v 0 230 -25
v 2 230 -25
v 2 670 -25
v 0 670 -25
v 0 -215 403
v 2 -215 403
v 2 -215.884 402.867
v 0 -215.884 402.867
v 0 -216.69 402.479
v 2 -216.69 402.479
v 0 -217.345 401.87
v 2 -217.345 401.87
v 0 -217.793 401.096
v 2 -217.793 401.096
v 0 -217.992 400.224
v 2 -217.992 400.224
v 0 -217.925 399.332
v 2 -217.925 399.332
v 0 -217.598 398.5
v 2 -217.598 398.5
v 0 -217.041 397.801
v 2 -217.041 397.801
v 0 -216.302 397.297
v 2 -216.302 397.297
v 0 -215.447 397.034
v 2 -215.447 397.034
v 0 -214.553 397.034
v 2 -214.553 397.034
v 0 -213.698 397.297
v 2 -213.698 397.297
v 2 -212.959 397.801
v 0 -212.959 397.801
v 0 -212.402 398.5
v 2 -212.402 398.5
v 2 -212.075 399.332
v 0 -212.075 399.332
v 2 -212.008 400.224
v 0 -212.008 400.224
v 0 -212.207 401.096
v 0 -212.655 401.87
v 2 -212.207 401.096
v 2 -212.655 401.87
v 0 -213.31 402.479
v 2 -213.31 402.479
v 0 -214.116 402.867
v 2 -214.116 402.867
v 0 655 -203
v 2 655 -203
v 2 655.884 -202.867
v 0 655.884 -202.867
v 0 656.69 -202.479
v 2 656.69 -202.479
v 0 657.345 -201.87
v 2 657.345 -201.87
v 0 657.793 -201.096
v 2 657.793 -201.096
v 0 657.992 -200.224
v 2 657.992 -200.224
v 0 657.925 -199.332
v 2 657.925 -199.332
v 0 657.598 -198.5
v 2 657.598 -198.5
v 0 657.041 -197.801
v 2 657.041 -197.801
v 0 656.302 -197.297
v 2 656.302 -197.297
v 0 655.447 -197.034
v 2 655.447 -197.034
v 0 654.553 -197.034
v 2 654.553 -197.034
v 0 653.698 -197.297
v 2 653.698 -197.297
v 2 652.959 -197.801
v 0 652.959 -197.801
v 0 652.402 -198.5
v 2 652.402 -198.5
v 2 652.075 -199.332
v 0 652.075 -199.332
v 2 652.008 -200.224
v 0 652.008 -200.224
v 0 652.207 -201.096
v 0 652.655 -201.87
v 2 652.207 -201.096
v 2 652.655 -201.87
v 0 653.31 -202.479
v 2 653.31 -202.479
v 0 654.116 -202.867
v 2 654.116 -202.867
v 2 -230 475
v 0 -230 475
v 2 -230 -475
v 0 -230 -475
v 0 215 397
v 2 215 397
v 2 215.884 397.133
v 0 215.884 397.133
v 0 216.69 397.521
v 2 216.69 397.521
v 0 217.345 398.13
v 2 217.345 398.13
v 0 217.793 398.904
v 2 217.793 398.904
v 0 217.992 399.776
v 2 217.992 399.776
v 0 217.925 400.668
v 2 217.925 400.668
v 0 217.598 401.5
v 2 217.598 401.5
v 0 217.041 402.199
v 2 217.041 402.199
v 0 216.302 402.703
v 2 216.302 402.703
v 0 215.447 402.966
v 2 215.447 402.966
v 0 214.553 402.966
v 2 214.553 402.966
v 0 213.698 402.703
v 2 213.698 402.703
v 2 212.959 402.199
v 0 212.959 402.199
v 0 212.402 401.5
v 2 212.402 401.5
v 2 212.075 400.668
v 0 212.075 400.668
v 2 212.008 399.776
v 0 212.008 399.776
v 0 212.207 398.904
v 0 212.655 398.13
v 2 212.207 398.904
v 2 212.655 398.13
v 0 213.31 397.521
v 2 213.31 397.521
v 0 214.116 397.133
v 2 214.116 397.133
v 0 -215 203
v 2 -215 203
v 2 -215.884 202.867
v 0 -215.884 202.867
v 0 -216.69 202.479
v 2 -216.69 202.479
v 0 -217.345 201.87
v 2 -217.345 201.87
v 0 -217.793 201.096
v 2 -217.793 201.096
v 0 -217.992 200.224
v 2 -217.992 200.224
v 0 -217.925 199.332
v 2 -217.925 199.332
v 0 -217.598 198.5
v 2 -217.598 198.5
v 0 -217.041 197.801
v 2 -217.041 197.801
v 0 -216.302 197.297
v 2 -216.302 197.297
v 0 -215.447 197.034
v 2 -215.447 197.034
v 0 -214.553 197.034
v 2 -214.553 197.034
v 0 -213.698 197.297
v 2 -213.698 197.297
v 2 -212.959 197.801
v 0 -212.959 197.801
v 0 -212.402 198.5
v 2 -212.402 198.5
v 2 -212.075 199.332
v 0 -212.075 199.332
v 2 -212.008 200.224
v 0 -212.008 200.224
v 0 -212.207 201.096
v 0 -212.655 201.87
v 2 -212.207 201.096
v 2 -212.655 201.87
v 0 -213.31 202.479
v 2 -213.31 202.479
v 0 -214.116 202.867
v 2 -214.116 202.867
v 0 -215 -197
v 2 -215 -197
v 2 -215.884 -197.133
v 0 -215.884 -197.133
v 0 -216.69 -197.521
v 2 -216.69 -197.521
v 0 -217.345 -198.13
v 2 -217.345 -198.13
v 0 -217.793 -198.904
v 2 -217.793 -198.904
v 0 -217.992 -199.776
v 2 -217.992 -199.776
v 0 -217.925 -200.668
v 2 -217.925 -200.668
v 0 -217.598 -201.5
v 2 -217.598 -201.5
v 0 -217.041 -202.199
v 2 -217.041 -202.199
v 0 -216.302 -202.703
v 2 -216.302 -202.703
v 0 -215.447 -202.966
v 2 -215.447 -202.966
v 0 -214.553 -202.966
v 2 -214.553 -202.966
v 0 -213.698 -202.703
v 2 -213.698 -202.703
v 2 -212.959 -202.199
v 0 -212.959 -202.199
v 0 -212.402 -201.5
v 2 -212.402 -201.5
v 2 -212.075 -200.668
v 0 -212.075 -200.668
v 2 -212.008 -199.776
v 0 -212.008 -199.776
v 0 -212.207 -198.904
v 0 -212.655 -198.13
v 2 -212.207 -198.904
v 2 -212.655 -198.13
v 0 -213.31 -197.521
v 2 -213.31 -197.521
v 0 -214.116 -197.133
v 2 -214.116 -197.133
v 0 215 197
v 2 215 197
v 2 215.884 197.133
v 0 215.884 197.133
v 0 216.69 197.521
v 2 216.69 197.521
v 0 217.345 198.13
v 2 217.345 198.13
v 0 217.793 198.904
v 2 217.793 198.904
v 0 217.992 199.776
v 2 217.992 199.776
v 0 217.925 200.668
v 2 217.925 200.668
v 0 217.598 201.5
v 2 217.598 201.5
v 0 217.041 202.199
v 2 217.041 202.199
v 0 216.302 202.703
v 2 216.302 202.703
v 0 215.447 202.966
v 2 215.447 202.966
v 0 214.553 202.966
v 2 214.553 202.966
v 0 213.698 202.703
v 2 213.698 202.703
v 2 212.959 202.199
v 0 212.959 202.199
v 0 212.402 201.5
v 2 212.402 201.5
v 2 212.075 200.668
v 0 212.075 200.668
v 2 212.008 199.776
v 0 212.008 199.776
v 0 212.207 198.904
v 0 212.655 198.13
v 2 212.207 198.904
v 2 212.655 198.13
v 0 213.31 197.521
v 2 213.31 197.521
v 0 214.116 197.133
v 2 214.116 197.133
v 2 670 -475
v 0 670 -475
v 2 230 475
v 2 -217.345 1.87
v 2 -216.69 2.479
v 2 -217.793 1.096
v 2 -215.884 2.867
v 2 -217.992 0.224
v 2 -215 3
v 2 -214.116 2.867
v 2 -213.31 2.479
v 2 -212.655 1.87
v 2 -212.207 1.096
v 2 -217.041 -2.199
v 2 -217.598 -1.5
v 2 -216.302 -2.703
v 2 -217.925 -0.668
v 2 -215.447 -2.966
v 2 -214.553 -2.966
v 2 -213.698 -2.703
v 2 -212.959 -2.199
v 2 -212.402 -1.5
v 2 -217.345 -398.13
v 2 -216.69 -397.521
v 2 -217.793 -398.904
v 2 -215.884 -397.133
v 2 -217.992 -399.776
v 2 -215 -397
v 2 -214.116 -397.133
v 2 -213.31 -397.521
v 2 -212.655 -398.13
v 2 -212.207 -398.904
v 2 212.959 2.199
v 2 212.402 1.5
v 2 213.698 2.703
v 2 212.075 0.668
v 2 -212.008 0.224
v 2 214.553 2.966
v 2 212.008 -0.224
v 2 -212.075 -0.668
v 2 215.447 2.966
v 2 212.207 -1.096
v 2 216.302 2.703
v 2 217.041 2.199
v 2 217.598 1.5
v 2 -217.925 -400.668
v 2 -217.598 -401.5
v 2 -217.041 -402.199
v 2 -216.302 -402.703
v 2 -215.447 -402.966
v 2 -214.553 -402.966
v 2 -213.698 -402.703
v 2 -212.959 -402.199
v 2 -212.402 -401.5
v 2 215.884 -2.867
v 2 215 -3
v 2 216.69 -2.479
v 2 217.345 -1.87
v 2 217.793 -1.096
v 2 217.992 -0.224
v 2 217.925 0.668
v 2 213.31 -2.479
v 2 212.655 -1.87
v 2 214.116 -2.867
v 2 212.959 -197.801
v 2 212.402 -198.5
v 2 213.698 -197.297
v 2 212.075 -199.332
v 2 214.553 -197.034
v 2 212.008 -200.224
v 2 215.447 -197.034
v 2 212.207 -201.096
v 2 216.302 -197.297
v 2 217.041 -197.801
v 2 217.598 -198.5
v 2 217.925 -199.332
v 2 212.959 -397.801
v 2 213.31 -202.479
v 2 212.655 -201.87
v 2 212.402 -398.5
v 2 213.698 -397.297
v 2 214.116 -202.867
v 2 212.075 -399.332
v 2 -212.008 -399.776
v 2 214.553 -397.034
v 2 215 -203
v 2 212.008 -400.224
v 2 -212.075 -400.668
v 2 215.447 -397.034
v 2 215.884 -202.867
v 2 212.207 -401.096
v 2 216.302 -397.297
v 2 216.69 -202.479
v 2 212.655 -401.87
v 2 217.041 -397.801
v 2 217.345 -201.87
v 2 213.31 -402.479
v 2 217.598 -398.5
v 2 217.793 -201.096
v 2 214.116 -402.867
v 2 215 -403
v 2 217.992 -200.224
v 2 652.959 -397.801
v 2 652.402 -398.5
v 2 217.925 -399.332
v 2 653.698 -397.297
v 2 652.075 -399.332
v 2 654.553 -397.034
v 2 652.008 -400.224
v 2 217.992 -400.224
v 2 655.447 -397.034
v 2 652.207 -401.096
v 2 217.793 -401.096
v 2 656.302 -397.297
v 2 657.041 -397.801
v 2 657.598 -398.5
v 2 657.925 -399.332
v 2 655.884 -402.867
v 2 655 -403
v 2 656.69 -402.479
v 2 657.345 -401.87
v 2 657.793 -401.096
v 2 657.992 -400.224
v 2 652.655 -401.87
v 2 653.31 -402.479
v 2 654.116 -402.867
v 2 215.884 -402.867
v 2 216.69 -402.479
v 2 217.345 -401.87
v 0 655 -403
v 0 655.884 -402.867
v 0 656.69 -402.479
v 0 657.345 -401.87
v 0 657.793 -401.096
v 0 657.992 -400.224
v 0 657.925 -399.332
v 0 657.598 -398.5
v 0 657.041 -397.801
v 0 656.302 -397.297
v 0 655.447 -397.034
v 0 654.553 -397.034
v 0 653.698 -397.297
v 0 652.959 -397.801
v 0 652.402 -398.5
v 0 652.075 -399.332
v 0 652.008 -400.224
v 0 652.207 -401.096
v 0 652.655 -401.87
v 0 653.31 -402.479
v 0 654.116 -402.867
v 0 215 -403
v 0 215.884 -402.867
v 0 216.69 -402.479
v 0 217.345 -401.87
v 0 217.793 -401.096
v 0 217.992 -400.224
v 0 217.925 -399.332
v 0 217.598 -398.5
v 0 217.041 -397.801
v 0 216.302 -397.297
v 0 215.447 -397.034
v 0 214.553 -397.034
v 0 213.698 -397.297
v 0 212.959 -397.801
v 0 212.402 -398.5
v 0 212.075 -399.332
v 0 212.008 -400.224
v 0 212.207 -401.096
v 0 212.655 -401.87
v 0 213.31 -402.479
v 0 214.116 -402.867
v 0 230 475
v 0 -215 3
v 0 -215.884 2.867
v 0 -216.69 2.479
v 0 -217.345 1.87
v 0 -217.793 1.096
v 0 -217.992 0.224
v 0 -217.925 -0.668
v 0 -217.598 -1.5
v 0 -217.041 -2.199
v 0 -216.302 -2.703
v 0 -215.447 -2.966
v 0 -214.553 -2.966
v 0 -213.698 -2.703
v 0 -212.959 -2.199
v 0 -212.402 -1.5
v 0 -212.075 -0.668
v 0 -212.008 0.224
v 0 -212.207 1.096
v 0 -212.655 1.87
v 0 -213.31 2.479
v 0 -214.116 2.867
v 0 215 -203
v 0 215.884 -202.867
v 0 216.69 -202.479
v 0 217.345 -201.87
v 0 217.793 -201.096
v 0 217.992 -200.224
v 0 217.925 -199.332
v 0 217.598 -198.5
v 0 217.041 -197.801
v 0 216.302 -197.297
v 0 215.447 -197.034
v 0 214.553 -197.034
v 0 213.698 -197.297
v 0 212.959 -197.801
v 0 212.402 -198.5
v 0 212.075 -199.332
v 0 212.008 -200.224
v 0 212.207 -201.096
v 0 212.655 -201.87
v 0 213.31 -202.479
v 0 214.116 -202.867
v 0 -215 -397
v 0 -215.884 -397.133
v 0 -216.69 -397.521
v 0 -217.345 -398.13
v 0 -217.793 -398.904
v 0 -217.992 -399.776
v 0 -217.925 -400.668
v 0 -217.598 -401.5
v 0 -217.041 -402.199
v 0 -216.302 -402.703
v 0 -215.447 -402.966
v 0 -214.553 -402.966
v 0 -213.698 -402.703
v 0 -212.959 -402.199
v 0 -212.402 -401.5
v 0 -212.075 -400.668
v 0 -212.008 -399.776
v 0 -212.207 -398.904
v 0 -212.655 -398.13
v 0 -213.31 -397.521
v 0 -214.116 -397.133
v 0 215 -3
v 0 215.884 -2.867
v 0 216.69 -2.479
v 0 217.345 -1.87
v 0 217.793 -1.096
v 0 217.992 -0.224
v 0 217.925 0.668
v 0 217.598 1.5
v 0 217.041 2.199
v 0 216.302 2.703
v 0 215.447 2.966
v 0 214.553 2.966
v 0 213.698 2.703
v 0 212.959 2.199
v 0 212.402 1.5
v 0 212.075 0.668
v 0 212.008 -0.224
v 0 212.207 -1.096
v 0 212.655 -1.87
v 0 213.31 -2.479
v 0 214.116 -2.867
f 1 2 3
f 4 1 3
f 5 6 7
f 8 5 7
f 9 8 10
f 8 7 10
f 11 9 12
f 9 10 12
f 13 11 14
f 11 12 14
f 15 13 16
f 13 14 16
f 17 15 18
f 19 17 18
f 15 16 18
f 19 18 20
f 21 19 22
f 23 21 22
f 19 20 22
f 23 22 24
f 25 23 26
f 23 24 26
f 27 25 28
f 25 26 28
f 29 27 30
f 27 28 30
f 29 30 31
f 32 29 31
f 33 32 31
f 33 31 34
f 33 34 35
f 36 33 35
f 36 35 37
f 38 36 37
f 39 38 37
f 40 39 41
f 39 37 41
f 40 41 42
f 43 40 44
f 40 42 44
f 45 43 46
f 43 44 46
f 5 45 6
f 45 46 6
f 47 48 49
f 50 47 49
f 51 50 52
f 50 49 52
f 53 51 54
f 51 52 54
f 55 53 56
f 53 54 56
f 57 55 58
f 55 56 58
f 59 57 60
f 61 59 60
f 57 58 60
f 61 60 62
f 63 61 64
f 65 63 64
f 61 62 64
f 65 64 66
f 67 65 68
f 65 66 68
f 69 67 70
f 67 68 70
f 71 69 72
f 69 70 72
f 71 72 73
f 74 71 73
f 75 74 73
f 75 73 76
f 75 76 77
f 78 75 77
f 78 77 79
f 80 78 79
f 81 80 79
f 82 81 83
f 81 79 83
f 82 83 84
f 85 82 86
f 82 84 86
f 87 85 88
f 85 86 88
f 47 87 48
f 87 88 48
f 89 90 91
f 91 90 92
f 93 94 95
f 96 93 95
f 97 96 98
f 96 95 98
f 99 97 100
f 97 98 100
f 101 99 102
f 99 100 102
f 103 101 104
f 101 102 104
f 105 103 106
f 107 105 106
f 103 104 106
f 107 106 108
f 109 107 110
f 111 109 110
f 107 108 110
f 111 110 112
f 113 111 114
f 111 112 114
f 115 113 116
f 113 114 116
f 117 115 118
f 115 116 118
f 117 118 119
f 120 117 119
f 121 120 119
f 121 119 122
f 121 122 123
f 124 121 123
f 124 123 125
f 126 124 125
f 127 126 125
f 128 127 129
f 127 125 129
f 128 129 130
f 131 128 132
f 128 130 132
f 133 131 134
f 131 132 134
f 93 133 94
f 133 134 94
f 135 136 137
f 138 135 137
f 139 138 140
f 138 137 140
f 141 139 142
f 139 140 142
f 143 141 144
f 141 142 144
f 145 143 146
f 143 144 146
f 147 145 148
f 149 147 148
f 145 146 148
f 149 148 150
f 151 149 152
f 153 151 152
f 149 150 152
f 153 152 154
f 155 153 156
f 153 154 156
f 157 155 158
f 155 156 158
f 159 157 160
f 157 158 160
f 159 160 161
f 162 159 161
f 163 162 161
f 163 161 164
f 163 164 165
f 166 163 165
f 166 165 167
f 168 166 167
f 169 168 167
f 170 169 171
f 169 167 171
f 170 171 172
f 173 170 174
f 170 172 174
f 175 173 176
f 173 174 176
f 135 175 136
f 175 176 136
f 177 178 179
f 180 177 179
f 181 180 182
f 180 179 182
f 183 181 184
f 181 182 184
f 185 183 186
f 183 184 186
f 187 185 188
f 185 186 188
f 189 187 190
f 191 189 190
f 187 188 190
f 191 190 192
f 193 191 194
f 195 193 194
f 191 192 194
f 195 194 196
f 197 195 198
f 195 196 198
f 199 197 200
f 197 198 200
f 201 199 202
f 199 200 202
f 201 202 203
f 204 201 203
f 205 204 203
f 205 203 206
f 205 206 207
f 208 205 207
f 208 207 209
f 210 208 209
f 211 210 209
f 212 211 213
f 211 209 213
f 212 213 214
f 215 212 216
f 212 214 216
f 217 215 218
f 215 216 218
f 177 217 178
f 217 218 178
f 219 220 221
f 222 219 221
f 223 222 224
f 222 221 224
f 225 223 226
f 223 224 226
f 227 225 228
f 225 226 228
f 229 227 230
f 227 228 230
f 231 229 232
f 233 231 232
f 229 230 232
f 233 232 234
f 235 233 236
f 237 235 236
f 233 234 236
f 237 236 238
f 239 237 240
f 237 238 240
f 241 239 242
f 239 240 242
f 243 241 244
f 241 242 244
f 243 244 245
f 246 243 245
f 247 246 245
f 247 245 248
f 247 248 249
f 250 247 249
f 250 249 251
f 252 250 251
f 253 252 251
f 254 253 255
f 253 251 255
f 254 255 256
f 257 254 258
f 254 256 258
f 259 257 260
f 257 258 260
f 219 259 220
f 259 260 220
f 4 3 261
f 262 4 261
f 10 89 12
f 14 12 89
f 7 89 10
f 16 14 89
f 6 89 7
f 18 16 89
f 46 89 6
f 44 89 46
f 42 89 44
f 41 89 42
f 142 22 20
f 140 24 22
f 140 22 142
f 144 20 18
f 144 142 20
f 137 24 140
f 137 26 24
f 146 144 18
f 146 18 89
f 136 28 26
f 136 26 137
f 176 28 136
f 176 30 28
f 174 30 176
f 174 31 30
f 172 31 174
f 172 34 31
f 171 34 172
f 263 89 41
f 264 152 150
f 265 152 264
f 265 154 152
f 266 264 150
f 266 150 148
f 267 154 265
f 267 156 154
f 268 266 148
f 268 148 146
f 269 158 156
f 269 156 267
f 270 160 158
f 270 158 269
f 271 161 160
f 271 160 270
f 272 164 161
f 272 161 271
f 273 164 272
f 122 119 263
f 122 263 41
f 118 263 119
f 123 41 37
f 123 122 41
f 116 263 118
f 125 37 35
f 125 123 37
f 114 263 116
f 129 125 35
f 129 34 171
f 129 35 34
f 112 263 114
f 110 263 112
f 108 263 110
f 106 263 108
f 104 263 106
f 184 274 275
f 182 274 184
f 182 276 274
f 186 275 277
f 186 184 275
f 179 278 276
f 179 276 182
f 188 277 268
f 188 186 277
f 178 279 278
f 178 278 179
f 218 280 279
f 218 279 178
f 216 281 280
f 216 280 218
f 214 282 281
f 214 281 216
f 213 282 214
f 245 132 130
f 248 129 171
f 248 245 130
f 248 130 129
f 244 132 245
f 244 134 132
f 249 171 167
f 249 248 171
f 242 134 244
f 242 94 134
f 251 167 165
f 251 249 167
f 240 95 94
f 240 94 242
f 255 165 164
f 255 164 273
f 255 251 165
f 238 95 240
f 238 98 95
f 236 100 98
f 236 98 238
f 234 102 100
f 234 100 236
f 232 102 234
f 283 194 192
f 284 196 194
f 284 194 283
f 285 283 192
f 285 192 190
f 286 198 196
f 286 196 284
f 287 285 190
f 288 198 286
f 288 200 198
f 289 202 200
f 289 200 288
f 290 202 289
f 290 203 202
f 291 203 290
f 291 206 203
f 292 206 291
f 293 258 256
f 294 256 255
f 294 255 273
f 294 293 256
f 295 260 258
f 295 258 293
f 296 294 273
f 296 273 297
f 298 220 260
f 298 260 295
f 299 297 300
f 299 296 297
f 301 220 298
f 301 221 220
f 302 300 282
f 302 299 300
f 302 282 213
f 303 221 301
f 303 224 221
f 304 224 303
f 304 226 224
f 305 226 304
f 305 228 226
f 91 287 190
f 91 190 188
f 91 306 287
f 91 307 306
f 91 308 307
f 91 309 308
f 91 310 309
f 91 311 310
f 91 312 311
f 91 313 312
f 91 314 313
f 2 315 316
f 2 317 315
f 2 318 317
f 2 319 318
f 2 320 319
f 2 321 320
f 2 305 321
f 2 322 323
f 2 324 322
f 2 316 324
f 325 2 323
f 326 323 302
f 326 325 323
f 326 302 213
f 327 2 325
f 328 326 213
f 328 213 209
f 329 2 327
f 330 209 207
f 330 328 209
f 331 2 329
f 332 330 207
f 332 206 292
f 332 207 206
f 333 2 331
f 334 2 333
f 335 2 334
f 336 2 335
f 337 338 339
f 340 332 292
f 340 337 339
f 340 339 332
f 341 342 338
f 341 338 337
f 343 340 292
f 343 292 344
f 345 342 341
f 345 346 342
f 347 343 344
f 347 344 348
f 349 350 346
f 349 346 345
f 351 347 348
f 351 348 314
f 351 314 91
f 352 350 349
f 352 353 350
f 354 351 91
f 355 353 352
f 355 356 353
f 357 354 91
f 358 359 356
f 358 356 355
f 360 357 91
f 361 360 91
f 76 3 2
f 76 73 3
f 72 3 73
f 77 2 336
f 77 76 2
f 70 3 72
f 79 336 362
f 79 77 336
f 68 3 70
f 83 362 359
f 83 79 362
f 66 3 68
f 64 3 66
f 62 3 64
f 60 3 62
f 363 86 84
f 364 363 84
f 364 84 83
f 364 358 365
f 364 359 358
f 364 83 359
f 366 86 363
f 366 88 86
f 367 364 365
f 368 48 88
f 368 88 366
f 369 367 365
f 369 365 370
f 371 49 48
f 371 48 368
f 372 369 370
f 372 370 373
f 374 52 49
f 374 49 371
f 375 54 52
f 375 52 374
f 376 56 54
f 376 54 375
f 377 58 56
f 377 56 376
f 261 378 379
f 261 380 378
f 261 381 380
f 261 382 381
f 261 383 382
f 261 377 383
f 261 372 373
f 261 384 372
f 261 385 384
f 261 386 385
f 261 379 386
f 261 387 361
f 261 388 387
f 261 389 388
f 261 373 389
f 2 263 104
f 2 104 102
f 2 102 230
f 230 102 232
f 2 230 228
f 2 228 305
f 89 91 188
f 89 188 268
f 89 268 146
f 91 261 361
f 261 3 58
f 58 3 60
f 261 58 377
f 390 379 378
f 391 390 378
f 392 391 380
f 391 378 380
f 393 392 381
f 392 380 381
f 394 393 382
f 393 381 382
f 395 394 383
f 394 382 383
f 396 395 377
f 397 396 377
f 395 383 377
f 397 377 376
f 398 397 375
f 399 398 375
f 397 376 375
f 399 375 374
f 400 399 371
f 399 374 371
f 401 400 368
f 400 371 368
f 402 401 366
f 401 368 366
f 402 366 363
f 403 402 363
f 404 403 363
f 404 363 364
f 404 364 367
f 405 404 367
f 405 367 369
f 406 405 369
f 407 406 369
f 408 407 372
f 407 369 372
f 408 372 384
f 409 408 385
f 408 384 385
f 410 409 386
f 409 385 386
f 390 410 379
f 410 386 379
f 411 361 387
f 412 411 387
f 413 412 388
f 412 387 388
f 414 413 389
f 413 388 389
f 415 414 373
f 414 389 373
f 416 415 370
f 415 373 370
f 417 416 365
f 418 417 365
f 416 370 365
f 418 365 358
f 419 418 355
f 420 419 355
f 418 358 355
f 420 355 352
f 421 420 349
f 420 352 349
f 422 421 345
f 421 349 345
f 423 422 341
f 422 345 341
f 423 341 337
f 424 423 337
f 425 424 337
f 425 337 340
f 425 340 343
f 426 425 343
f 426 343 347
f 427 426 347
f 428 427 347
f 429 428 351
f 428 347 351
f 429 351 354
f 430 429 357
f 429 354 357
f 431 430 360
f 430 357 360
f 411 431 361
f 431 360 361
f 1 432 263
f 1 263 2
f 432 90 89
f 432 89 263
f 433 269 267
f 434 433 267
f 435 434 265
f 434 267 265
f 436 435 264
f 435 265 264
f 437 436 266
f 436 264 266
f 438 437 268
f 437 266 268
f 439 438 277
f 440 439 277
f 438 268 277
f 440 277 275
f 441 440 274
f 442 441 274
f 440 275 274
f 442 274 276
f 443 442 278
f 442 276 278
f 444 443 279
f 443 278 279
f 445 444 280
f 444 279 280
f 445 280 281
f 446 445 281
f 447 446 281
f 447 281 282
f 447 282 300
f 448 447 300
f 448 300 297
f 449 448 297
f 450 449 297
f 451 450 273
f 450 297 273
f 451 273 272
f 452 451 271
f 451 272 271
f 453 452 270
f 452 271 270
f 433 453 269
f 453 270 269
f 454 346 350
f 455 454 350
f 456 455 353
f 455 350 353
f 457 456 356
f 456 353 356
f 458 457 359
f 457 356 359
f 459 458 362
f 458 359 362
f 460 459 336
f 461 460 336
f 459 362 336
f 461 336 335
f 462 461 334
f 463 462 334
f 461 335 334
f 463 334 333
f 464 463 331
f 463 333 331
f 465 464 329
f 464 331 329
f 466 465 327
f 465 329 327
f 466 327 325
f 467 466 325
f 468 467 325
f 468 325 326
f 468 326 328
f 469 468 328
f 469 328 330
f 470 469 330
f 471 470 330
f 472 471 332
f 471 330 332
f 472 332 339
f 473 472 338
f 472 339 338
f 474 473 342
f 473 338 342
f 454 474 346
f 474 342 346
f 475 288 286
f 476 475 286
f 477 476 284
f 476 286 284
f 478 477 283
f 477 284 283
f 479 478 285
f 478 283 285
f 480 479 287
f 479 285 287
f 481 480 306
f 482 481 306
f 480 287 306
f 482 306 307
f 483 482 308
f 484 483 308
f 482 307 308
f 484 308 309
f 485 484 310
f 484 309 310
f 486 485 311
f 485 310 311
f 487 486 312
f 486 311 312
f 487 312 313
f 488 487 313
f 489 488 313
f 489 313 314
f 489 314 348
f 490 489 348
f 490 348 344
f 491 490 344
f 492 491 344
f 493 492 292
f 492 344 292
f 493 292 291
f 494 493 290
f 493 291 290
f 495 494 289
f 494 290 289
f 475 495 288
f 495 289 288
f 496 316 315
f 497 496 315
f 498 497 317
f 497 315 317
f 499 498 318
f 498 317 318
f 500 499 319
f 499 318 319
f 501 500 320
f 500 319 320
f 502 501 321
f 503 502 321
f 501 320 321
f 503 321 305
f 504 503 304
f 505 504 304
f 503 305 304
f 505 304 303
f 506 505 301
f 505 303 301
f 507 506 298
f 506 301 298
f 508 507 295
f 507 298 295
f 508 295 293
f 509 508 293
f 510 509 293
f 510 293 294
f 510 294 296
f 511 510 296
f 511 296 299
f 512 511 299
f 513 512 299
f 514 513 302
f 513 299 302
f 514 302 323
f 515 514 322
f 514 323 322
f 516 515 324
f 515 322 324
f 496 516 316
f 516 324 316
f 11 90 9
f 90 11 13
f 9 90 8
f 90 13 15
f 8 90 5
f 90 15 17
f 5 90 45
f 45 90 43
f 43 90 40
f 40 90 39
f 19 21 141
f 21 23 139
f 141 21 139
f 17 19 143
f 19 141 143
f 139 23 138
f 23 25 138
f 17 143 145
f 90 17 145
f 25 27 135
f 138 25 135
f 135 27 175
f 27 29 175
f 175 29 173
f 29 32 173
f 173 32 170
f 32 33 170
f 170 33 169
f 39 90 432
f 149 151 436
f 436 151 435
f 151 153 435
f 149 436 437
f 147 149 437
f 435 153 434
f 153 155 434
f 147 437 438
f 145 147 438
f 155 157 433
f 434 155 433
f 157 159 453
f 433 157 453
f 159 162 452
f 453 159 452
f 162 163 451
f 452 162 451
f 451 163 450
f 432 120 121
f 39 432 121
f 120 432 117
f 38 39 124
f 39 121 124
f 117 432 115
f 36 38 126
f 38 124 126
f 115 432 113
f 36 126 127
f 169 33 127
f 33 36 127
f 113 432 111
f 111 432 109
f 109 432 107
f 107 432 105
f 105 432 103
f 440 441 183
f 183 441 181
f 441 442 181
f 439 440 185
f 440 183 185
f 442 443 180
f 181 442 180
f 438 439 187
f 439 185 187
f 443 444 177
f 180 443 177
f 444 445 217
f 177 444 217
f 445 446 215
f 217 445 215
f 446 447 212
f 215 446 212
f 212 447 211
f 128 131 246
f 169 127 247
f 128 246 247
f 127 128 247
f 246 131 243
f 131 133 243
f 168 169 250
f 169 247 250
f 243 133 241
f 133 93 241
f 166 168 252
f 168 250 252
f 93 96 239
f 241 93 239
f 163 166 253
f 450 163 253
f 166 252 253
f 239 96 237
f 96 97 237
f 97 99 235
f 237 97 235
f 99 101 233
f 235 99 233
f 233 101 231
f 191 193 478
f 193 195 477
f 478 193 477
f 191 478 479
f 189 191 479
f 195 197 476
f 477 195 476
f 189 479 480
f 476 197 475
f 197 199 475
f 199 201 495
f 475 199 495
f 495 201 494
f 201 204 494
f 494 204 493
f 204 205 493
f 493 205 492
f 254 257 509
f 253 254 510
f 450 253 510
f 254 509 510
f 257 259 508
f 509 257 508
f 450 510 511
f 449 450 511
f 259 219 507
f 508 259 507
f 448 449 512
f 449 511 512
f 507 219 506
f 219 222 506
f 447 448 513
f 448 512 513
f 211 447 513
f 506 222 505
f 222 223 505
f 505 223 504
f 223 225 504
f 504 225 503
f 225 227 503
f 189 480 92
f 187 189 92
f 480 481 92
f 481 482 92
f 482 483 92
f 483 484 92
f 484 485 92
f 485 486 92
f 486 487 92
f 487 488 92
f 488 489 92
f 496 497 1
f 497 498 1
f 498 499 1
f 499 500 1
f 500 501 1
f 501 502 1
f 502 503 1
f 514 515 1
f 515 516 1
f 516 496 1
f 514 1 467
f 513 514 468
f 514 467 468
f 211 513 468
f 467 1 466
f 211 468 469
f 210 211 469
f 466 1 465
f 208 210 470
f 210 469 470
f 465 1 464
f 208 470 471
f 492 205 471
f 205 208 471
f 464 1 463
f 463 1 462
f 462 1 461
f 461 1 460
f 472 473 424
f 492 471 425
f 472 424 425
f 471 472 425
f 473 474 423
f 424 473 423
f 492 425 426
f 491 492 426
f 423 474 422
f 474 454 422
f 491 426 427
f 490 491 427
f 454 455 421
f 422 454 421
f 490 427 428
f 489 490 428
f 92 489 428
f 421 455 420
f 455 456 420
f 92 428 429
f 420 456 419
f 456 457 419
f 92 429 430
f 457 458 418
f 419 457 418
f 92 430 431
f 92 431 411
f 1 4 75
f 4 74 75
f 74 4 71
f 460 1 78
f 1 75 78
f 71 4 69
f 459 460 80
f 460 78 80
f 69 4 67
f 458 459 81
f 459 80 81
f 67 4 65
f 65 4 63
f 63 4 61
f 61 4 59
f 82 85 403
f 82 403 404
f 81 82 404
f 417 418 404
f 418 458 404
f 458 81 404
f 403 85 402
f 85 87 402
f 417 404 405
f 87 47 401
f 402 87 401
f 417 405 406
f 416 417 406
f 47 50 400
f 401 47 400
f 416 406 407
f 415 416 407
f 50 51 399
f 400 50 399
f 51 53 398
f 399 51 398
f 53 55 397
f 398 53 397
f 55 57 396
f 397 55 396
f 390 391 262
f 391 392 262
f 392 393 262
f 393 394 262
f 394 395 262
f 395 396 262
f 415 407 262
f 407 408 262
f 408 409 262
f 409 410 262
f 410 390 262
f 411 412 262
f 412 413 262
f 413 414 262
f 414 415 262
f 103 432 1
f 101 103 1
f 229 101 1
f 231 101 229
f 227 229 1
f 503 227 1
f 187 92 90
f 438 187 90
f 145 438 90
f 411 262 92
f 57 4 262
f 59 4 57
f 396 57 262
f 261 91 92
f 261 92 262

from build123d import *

# Parameters (mm, degrees)
SKETCH1_W           = 950
SKETCH1_H           = 460
BOSS_EXTRUDE2_DEPTH = 2
SKETCH3_R           = 3
CUT_EXTRUDE1_DEPTH  = 2
SKETCH5_W           = 450
SKETCH5_H           = 440
SKETCH5_R           = 3
BOSS_EXTRUDE3_DEPTH = 2


with BuildPart() as part:
    # Sketch1 → Boss-Extrude2 (new body)
    with BuildSketch(Plane(origin=(0, 0, 0), x_dir=(0, 0, -1), z_dir=(1, 0, 0))):
        Rectangle(SKETCH1_W, SKETCH1_H)
    extrude(amount=BOSS_EXTRUDE2_DEPTH)

    # Sketch3 → Cut-Extrude1 (cut)
    with BuildSketch(Plane(origin=(2, 0, 0), x_dir=(0, 0, -1), z_dir=(1, 0, 0))):
        with Locations((-400, 215)):
            Circle(SKETCH3_R)
        with Locations((-200, 215)):
            Circle(SKETCH3_R)
        with Locations((0, 215)):
            Circle(SKETCH3_R)
        with Locations((200, 215)):
            Circle(SKETCH3_R)
        with Locations((400, 215)):
            Circle(SKETCH3_R)
        with Locations(Location((400, -215, 0), (0, 0, 180))):
            Circle(SKETCH3_R)
        with Locations(Location((0, -215, 0), (0, 0, 180))):
            Circle(SKETCH3_R)
        with Locations(Location((200, -215, 0), (0, 0, 180))):
            Circle(SKETCH3_R)
        with Locations(Location((-200, -215, 0), (0, 0, 180))):
            Circle(SKETCH3_R)
        with Locations(Location((-400, -215, 0), (0, 0, 180))):
            Circle(SKETCH3_R)
    extrude(amount=-CUT_EXTRUDE1_DEPTH, mode=Mode.SUBTRACT)

    # Sketch5 → Boss-Extrude3 (add)
    with BuildSketch(Plane(origin=(2, 0, 0), x_dir=(0, 0, -1), z_dir=(1, 0, 0))):
        with Locations((250, 450)):
            Rectangle(SKETCH5_W, SKETCH5_H)
        with Locations((400, 655)):
            Circle(SKETCH5_R, mode=Mode.SUBTRACT)
        with Locations((200, 655)):
            Circle(SKETCH5_R, mode=Mode.SUBTRACT)
    extrude(amount=-BOSS_EXTRUDE3_DEPTH)


solid = part.part
